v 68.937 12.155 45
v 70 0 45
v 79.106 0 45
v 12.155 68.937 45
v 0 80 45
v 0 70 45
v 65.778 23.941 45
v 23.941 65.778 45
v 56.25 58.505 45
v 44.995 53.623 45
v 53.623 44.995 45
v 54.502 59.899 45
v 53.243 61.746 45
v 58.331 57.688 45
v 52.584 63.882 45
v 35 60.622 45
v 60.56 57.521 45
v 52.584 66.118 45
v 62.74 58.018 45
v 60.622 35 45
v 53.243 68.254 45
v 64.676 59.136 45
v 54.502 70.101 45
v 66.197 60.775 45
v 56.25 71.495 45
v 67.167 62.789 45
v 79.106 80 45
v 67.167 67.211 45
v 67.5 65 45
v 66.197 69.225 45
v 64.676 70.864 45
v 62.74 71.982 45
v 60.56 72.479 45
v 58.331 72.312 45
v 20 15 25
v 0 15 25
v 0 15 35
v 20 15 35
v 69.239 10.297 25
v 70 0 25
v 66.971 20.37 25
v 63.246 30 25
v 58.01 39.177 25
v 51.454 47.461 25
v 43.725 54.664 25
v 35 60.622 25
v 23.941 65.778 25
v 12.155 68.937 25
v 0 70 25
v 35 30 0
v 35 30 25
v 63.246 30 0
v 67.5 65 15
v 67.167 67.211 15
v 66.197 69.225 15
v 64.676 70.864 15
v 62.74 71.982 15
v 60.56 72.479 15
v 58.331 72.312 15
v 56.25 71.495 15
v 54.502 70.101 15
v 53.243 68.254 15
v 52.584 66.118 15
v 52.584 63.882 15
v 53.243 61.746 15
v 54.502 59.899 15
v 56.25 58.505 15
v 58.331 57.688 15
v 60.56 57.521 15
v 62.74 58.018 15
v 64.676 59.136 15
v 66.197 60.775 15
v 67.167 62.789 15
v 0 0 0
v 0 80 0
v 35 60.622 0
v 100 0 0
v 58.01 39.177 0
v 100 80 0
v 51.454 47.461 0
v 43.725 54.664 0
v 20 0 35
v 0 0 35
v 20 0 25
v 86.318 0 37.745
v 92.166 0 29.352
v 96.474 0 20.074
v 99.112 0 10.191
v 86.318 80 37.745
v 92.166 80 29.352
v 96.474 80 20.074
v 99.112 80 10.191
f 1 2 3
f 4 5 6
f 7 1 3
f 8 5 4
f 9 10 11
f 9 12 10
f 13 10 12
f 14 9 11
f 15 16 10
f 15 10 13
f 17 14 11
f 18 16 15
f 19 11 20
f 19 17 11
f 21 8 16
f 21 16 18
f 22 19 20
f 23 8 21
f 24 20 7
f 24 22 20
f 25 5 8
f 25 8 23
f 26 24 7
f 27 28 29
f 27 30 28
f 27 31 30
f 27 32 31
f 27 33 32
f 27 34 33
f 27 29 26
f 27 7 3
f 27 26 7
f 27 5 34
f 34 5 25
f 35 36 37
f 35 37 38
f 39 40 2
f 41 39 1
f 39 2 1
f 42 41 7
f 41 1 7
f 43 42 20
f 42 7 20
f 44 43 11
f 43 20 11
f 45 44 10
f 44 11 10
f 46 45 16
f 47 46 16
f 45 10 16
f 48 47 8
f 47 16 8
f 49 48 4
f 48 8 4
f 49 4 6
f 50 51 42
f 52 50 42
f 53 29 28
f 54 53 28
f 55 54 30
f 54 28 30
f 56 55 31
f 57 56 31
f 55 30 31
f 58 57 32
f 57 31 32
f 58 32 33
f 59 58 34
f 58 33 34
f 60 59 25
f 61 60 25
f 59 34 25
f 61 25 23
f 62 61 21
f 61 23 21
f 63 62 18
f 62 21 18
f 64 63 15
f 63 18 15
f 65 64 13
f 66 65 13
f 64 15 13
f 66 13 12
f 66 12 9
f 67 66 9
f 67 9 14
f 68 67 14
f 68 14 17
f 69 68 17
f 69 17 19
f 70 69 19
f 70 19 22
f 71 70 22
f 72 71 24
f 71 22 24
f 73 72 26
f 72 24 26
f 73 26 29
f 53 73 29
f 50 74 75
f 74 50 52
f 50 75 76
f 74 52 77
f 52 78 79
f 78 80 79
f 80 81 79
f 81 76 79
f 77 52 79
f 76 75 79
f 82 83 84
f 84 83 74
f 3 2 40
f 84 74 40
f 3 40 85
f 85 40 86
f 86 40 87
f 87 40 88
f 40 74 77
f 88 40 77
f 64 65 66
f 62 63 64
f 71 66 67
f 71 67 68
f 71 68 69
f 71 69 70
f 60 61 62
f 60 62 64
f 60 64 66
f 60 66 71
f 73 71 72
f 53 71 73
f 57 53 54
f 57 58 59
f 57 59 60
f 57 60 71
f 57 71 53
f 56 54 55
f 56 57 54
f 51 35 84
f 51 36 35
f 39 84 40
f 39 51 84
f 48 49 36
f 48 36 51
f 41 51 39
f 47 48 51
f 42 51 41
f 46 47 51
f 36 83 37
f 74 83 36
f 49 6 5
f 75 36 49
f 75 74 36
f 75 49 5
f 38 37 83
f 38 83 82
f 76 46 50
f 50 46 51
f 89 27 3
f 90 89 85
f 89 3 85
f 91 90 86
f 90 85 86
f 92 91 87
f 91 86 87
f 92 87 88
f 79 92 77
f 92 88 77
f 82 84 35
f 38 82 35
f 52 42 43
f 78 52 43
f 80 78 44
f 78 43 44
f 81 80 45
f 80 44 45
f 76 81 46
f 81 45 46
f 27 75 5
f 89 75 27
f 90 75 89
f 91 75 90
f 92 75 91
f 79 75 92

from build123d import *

# Parameters (mm, degrees)
F0_W      = 100
F0_H      = 80
F1_DEPTH  = 45
F5_R      = 7.5
F6_DEPTH  = 30
F8_DEPTH  = 80.001
F9_R      = 70
F10_DEPTH = 20
F11_W     = 20
F11_H     = 15
F12_DEPTH = 10
F14_DEPTH = 25.001


with BuildPart() as f1:
    # F0 (on Top) → F1 (new body)
    with BuildSketch(Plane.XY):
        with Locations((50, 40)):
            Rectangle(F0_W, F0_H)
    extrude(amount=F1_DEPTH)

    # F5 (on face) → F6 (cut, through all)
    with BuildSketch(Plane.XY.offset(45)):
        with Locations((60, 65)):
            Circle(F5_R)
    extrude(amount=-F6_DEPTH, mode=Mode.SUBTRACT)

    # F7 (on face) → F8 (cut, through all)
    with BuildSketch(Plane.XZ):
        with BuildLine():
            ThreePointArc((79.1062268166, 45), (94.5218269018, 24.8070038388), (100, 0))
            Line((100, 0), (100, 45))
            Line((100, 45), (79.1062268166, 45))
        make_face()
    extrude(amount=-F8_DEPTH, mode=Mode.SUBTRACT)

    # F9 (on face) → F10 (cut, through all)
    with BuildSketch(Plane.XY.offset(45)):
        Circle(F9_R)
    extrude(amount=-F10_DEPTH, mode=Mode.SUBTRACT)

    # F11 (on face) → F12 (join, through all)
    with BuildSketch(Plane.XY.offset(25)):
        with Locations((10, 7.5)):
            Rectangle(F11_W, F11_H)
    extrude(amount=F12_DEPTH)

    # F13 (on face) → F14 (cut, through all)
    with BuildSketch(Plane.XY.offset(25)):
        with BuildLine():
            Line((35, 30), (63.2455532034, 30))
            ThreePointArc((63.2455532034, 30), (51.4535762322, 47.4608206094), (35, 60.6217782649))
            Line((35, 60.6217782649), (35, 30))
        make_face()
    extrude(amount=-F14_DEPTH, mode=Mode.SUBTRACT)


solid = f1.part
